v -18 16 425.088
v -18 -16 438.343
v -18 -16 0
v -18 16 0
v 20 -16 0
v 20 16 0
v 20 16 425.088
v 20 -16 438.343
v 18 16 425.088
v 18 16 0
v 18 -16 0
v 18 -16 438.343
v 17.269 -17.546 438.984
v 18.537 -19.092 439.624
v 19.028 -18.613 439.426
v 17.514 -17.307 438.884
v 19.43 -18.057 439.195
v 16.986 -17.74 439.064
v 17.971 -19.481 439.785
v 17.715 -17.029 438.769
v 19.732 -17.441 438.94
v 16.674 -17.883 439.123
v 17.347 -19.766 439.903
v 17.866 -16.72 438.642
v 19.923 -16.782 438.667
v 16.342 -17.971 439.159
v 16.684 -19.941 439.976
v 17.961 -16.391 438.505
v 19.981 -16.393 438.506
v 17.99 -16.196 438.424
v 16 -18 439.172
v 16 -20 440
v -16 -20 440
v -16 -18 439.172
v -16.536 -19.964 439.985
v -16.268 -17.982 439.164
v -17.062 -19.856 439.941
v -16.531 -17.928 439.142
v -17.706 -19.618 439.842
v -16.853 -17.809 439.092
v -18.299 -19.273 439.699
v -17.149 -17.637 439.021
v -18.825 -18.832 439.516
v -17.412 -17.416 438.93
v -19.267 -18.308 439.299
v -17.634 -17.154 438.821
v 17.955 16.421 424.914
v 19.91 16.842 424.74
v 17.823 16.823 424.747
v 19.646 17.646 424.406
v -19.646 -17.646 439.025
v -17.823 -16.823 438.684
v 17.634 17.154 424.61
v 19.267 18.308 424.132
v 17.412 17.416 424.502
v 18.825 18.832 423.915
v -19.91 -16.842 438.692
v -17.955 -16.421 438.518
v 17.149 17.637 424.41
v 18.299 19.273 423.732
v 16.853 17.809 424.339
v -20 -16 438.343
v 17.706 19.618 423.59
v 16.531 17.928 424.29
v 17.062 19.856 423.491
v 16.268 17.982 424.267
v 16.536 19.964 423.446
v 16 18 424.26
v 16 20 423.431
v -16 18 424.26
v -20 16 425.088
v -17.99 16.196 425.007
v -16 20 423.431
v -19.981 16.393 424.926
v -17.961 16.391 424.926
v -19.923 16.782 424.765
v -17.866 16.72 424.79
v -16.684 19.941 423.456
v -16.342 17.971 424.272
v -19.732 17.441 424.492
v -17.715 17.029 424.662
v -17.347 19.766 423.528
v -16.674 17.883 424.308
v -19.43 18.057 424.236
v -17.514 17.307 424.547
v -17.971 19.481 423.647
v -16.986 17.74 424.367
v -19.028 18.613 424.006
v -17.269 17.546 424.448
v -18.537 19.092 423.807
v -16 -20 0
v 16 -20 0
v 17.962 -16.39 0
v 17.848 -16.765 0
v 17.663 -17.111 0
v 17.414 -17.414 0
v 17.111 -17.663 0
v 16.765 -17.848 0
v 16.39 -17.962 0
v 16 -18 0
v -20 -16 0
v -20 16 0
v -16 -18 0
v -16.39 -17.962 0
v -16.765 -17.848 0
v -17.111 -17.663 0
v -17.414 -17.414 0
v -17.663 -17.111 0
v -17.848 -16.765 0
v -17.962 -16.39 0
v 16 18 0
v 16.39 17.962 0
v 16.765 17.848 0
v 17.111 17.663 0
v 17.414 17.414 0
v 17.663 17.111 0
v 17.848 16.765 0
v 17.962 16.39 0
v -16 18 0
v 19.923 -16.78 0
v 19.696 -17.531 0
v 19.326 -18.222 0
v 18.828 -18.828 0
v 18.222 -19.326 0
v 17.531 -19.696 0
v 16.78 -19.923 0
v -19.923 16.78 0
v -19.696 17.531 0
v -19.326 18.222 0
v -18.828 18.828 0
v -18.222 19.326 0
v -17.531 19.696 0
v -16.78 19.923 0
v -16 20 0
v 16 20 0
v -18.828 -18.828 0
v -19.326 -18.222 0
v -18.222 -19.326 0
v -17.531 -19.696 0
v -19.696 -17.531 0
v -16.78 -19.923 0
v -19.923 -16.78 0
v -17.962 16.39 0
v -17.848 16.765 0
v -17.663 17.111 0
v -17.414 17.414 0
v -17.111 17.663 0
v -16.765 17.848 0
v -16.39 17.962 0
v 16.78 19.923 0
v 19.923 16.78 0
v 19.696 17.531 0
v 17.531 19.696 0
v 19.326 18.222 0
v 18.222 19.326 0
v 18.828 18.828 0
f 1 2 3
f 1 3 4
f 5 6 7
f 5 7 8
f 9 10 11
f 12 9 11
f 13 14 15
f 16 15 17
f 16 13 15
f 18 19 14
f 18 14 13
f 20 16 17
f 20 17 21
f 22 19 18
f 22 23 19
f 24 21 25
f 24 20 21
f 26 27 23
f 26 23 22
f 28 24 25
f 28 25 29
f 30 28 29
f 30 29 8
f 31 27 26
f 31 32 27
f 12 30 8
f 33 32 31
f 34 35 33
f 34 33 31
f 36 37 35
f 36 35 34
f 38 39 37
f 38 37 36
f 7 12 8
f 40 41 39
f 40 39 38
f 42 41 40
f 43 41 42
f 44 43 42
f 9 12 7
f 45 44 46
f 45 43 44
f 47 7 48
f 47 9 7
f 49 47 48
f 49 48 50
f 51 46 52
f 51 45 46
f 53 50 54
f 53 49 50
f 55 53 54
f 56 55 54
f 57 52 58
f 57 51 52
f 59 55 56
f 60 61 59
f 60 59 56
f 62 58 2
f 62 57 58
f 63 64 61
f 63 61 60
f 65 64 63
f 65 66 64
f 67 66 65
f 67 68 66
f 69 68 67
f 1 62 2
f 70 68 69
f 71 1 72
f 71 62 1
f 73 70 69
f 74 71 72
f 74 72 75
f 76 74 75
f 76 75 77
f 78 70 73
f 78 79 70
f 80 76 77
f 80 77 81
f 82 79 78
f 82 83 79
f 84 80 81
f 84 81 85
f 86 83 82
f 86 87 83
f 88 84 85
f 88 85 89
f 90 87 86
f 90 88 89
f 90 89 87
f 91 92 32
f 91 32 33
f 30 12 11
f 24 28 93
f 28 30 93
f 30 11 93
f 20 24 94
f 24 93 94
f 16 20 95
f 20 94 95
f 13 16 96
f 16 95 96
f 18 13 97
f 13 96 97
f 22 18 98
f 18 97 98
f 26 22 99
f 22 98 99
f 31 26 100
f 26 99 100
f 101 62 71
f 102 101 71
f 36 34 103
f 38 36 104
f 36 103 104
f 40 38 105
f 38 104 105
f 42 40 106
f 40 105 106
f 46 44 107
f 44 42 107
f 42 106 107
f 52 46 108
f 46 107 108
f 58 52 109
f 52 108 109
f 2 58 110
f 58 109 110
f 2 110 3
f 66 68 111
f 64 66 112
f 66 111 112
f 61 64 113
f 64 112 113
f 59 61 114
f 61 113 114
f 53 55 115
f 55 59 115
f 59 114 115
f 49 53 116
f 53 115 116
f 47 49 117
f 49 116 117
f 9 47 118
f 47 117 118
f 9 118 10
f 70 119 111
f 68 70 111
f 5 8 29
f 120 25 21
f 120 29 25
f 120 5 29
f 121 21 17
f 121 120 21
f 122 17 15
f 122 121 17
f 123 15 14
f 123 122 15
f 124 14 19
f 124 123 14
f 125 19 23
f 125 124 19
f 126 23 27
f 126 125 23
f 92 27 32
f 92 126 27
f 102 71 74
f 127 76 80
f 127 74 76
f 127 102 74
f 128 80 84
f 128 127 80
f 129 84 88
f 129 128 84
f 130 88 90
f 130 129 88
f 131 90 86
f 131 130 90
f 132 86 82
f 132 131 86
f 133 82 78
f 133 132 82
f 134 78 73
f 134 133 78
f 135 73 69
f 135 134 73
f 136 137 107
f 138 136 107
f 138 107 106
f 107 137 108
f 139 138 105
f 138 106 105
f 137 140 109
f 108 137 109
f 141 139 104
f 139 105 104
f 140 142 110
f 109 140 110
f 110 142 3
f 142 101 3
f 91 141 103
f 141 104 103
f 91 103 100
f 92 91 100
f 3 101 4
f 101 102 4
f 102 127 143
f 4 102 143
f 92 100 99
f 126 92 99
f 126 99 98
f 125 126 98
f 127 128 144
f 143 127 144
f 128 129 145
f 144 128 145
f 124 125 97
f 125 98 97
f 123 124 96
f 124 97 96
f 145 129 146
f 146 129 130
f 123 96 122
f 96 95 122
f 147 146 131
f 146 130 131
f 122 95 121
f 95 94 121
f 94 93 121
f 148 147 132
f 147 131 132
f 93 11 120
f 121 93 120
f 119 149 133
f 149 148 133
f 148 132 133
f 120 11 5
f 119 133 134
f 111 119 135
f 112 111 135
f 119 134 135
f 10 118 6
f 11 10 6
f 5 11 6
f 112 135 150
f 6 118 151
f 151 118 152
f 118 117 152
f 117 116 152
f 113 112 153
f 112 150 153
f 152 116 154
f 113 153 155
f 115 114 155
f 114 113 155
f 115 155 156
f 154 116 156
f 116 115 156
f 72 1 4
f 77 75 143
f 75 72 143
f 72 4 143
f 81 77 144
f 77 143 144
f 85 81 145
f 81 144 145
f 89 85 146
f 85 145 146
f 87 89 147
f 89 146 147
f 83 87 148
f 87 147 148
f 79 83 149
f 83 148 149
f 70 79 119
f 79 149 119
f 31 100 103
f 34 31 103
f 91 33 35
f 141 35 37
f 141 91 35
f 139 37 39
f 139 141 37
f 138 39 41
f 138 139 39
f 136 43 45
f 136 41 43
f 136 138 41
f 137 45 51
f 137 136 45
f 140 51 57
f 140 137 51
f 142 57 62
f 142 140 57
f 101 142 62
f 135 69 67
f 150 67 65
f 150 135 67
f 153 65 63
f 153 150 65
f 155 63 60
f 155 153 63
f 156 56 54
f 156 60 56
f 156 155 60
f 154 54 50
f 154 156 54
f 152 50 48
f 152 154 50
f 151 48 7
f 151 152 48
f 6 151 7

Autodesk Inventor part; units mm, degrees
ref_plane "Start Plane" through (0, 0, 0) normal (0, 0, 1) x (1, 0, 0)
ref_plane "End Plane" through (0, 0, 440) normal (0, 0, 1) x (1, 0, 0)
sketch "Sketch" plane through (0, 0, 0) normal (0, 0, 1) x (1, 0, 0)
  line L0 (-20, -16) -> (-20, 16)
  line L1 (-16, 20) -> (16, 20)
  line L2 (20, 16) -> (20, -16)
  line L3 (16, -20) -> (-16, -20)
  arc A0 (-20, -16) -> (-16, -20) centre (-16, -16) ccw
  arc A1 (20, 16) -> (16, 20) centre (16, 16) ccw
  arc A2 (-16, 20) -> (-20, 16) centre (-16, 16) ccw
  arc A3 (16, -20) -> (20, -16) centre (16, -16) ccw
  arc A4 (-16, 18) -> (-18, 16) centre (-16, 16) ccw
  line L4 (-16, 18) -> (16, 18)
  arc A5 (18, 16) -> (16, 18) centre (16, 16) ccw
  line L5 (18, 16) -> (18, -16)
  arc A6 (16, -18) -> (18, -16) centre (16, -16) ccw
  line L6 (16, -18) -> (-16, -18)
  arc A7 (-18, -16) -> (-16, -18) centre (-16, -16) ccw
  line L7 (-18, -16) -> (-18, 16)
  line L8 (0, 29.1598) -> (0, -29.1598) construction
  line L9 (-29.1598, 0) -> (29.1598, 0) construction
  dimension "d7" = 4
  dimension "d9" = 40
  dimension "d11" = 40
  dimension "d12" = 2
  dimension "d15" = 20
  dimension "d16" = 20
extrude "Body" add sketch "Sketch" along normal up to surface (440 mm away) from surface at 0
sketch "Sketch3" plane through (0, 0, 0) normal (0, 0, 1) x (1, 0, 0)
  line L0 (0, 0) -> (10, 0)
ref_plane "Work Plane3" through (0, 0, 0) normal (0, -1, 0) x (1, 0, 0)
ref_plane "Work Plane4" through (0, -20, 440) normal (0, 0.3827, 0.9239) x (1, 0, 0)
split "Split1" plane through (0, -20, 440) removes the side toward (0, 0.3827, 0.9239)
sketch "Sketch4" plane through (0, 0, 0) normal (0, -1, 0) x (1, 0, 0)
  line L0 (-2, 0) -> (12, 0) projected
  line L1 (-2, 440) -> (12, 440) projected
  dimension "d18" = 440
equation "\"d7\" = G_IR"
equation "\"d9\" = G_W"
equation "\"d11\" = G_H"
equation "\"d12\" = G_T"
equation "\"d15\" = 0.5 * d9"
equation "\"d16\" = 0.5 * d11"
equation "\"d3\" = G_L"
equation "\"G_W\" = 40"
equation "\"G_H\" = 40"
equation "\"G_T\" = 2"
equation "\"G_IR\" = 4"
equation "\"G_L\" = d18"
equation "\"G_OFFSET_START\" = 0"
equation "\"G_OFFSET_END\" = 0"
properties part number "ISO 10799-2 - 40x40x2 - 440" material "Stainless Steel"
